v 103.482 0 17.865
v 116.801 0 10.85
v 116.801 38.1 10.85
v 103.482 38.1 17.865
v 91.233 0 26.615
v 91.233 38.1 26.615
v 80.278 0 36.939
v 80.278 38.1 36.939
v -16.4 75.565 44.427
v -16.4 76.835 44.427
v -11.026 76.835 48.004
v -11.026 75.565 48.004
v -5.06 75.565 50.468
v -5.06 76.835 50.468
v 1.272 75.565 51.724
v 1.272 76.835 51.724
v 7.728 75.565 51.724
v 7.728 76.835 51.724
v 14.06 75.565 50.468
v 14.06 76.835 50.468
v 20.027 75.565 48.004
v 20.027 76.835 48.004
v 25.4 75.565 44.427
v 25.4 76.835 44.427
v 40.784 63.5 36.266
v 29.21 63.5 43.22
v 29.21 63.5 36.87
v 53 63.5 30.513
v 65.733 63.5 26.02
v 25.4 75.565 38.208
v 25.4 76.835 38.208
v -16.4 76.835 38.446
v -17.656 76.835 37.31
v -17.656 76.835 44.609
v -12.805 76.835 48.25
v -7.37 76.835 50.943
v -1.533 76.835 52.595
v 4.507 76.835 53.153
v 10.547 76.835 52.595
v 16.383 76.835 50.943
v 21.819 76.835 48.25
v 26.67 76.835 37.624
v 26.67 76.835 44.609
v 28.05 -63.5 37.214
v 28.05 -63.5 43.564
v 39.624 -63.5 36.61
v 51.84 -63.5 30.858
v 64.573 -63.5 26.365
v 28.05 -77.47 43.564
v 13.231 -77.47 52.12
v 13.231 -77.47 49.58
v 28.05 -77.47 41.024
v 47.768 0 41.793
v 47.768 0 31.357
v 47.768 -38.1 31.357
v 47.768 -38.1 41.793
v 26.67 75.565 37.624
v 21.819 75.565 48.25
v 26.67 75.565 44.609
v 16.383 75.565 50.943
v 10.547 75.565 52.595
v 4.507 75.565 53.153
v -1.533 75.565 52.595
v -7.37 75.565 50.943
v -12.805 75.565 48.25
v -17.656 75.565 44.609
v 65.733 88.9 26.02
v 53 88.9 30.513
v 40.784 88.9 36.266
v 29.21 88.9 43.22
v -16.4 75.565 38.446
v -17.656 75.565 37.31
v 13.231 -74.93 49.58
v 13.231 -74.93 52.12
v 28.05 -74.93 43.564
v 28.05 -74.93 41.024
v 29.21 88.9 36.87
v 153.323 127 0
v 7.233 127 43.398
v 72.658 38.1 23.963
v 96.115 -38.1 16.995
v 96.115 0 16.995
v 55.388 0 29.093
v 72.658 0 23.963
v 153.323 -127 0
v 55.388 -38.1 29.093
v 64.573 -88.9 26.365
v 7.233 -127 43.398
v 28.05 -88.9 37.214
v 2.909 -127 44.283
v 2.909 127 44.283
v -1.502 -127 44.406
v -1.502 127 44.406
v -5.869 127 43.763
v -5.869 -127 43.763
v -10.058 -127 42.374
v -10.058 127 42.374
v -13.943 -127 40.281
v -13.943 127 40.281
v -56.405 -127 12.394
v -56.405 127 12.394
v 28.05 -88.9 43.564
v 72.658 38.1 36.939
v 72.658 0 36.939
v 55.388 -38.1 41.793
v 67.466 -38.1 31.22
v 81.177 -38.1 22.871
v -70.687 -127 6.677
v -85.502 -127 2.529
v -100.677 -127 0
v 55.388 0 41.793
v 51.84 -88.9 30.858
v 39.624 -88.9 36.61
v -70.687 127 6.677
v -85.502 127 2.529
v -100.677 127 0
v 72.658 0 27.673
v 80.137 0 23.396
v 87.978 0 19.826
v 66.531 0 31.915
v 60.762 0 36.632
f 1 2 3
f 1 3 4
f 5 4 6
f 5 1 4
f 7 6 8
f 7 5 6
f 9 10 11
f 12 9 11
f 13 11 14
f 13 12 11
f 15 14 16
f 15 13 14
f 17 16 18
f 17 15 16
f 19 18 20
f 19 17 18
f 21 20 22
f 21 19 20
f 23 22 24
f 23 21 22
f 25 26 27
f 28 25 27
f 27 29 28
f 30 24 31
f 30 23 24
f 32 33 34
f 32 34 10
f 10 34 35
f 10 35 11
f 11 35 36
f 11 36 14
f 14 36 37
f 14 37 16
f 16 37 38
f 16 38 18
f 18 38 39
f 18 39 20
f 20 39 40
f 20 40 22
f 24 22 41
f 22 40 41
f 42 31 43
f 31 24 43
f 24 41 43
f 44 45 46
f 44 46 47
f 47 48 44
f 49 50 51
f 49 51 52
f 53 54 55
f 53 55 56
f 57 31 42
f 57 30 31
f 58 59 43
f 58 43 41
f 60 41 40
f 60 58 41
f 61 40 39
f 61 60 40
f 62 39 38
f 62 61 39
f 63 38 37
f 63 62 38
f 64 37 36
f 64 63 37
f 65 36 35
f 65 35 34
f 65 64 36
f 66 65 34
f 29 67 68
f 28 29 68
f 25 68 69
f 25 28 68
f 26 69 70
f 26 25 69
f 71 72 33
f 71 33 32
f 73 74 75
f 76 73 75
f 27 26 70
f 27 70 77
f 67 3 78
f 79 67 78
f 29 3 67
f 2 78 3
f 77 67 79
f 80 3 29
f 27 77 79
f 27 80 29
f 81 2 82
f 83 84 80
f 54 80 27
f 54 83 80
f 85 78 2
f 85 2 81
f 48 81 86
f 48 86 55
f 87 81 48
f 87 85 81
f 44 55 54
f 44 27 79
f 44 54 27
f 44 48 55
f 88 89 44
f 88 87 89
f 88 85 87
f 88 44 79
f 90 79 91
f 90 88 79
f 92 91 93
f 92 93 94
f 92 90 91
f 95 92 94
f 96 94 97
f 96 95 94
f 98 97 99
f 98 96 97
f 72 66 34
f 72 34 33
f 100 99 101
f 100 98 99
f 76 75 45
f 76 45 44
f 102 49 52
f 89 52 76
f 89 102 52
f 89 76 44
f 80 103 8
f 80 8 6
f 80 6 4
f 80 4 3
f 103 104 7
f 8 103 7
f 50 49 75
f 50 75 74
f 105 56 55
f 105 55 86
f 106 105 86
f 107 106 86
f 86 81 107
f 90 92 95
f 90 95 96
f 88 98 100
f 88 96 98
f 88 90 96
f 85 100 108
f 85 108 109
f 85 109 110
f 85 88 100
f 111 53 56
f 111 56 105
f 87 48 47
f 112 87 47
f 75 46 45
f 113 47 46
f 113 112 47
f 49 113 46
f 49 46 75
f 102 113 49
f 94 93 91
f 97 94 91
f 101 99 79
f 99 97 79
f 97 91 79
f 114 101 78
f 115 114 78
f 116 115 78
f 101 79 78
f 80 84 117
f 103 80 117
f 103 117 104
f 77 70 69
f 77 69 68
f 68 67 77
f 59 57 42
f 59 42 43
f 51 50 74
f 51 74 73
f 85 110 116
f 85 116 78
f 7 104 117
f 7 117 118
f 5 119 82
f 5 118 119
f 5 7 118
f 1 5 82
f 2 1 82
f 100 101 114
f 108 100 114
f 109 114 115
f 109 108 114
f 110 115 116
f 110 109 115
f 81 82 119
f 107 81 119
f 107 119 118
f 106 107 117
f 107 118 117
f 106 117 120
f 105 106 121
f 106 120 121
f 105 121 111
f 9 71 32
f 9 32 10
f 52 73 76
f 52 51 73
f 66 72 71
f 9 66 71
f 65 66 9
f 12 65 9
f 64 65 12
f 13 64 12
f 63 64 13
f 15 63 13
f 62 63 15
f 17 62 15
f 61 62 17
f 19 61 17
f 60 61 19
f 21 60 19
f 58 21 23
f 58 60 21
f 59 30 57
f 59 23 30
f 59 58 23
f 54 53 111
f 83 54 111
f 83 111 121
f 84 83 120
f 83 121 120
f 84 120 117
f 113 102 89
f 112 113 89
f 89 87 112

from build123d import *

# Parameters (mm, degrees)
F1_DEPTH  = 127
F2_W      = 7.62
F2_H      = 12.7
F3_DEPTH  = 38.1
F4_W      = 7.62
F4_H      = 15.24
F5_DEPTH  = 38.1
F8_DEPTH  = 12.7
F11_DEPTH = 12.7
F13_DEPTH = 1.27
F15_DEPTH = 0.635


with BuildPart() as f1:
    # F0 (on Front) → F1 (new body, symmetric)
    with BuildSketch(Plane.XZ):
        with BuildLine():
            Line((-13.943291, 40.280747), (-56.404786, 12.394164))
            ThreePointArc((-56.404786, 12.394164), (-78.038562, 4.403193), (-100.676755, 0))
            Line((-100.676755, 0), (-75.276755, 0))
            Line((-75.276755, 0), (153.323245, 0))
            Line((153.323245, 0), (7.233061, 43.398364))
            ThreePointArc((7.233061, 43.398364), (-3.699552, 44.179133), (-13.943291, 40.280747))
        make_face()
    extrude(amount=F1_DEPTH, both=True)

    # F2 (on Front) → F3 (join)
    with BuildSketch(Plane.XZ):
        with BuildLine():
            Line((55.387878, 41.793226), (55.387878, 29.093226))
            Line((55.387878, 29.093226), (96.1152, 16.994541))
            ThreePointArc((96.1152, 16.994541), (74.142006, 26.750519), (55.387878, 41.793226))
        make_face()
        with Locations((51.577878, 35.443226)):
            Rectangle(F2_W, F2_H)
    extrude(amount=F3_DEPTH)

    # F4 (on Front) → F5 (join)
    with BuildSketch(Plane.XZ):
        with BuildLine():
            ThreePointArc((116.800699, 10.849591), (97.20939, 22.032483), (80.278153, 36.939182))
            Line((80.278153, 36.939182), (80.278153, 21.699182))
            Line((80.278153, 21.699182), (116.800699, 10.849591))
        make_face()
        with Locations((76.468153, 29.319182)):
            Rectangle(F4_W, F4_H)
    extrude(amount=-F5_DEPTH)

    # F7 (on offset) → F8 (join, symmetric)
    with BuildSketch(Plane.XZ.offset(76.2)):
        with BuildLine():
            Line((28.050448, 43.564235), (28.050448, 37.214235))
            Line((28.050448, 37.214235), (64.572994, 26.364644))
            ThreePointArc((64.572994, 26.364644), (45.659641, 33.579777), (28.050448, 43.564235))
        make_face()
    extrude(amount=F8_DEPTH, both=True)

    # F10 (on offset) → F11 (join, symmetric)
    with BuildSketch(Plane.XZ.offset(-76.2)):
        with BuildLine():
            ThreePointArc((65.732546, 26.020181), (46.819193, 33.235314), (29.21, 43.219772))
            Line((29.21, 43.219772), (29.21, 36.869772))
            Line((29.21, 36.869772), (65.732546, 26.020181))
        make_face()
    extrude(amount=F11_DEPTH, both=True)

    # F12 (on offset) → F13 (join, symmetric)
    with BuildSketch(Plane.XZ.offset(76.2)):
        Polygon((28.050448, 41.024235), (28.050448, 43.564235), (13.230578, 52.120491), (13.230578, 49.580491), align=None)
    extrude(amount=F13_DEPTH, both=True)


with BuildPart() as f15:
    # F14 (on offset) → F15 (new body, symmetric)
    with BuildSketch(Plane.XZ.offset(-76.2)):
        with BuildLine():
            Line((25.4, 38.208426), (26.67, 37.624319))
            Line((26.67, 37.624319), (26.67, 44.609319))
            ThreePointArc((26.67, 44.609319), (4.506834, 53.152504), (-17.656332, 44.609319))
            Line((-17.656332, 44.609319), (-17.656332, 37.309626))
            Line((-17.656332, 37.309626), (-16.399552, 38.446255))
            Line((-16.399552, 38.446255), (-16.399552, 44.426554))
            ThreePointArc((-16.399552, 44.426554), (4.500224, 51.882521), (25.4, 44.426554))
            Line((25.4, 44.426554), (25.4, 38.208426))
        make_face()
    extrude(amount=F15_DEPTH, both=True)


solid = Compound([f1.part, f15.part])
